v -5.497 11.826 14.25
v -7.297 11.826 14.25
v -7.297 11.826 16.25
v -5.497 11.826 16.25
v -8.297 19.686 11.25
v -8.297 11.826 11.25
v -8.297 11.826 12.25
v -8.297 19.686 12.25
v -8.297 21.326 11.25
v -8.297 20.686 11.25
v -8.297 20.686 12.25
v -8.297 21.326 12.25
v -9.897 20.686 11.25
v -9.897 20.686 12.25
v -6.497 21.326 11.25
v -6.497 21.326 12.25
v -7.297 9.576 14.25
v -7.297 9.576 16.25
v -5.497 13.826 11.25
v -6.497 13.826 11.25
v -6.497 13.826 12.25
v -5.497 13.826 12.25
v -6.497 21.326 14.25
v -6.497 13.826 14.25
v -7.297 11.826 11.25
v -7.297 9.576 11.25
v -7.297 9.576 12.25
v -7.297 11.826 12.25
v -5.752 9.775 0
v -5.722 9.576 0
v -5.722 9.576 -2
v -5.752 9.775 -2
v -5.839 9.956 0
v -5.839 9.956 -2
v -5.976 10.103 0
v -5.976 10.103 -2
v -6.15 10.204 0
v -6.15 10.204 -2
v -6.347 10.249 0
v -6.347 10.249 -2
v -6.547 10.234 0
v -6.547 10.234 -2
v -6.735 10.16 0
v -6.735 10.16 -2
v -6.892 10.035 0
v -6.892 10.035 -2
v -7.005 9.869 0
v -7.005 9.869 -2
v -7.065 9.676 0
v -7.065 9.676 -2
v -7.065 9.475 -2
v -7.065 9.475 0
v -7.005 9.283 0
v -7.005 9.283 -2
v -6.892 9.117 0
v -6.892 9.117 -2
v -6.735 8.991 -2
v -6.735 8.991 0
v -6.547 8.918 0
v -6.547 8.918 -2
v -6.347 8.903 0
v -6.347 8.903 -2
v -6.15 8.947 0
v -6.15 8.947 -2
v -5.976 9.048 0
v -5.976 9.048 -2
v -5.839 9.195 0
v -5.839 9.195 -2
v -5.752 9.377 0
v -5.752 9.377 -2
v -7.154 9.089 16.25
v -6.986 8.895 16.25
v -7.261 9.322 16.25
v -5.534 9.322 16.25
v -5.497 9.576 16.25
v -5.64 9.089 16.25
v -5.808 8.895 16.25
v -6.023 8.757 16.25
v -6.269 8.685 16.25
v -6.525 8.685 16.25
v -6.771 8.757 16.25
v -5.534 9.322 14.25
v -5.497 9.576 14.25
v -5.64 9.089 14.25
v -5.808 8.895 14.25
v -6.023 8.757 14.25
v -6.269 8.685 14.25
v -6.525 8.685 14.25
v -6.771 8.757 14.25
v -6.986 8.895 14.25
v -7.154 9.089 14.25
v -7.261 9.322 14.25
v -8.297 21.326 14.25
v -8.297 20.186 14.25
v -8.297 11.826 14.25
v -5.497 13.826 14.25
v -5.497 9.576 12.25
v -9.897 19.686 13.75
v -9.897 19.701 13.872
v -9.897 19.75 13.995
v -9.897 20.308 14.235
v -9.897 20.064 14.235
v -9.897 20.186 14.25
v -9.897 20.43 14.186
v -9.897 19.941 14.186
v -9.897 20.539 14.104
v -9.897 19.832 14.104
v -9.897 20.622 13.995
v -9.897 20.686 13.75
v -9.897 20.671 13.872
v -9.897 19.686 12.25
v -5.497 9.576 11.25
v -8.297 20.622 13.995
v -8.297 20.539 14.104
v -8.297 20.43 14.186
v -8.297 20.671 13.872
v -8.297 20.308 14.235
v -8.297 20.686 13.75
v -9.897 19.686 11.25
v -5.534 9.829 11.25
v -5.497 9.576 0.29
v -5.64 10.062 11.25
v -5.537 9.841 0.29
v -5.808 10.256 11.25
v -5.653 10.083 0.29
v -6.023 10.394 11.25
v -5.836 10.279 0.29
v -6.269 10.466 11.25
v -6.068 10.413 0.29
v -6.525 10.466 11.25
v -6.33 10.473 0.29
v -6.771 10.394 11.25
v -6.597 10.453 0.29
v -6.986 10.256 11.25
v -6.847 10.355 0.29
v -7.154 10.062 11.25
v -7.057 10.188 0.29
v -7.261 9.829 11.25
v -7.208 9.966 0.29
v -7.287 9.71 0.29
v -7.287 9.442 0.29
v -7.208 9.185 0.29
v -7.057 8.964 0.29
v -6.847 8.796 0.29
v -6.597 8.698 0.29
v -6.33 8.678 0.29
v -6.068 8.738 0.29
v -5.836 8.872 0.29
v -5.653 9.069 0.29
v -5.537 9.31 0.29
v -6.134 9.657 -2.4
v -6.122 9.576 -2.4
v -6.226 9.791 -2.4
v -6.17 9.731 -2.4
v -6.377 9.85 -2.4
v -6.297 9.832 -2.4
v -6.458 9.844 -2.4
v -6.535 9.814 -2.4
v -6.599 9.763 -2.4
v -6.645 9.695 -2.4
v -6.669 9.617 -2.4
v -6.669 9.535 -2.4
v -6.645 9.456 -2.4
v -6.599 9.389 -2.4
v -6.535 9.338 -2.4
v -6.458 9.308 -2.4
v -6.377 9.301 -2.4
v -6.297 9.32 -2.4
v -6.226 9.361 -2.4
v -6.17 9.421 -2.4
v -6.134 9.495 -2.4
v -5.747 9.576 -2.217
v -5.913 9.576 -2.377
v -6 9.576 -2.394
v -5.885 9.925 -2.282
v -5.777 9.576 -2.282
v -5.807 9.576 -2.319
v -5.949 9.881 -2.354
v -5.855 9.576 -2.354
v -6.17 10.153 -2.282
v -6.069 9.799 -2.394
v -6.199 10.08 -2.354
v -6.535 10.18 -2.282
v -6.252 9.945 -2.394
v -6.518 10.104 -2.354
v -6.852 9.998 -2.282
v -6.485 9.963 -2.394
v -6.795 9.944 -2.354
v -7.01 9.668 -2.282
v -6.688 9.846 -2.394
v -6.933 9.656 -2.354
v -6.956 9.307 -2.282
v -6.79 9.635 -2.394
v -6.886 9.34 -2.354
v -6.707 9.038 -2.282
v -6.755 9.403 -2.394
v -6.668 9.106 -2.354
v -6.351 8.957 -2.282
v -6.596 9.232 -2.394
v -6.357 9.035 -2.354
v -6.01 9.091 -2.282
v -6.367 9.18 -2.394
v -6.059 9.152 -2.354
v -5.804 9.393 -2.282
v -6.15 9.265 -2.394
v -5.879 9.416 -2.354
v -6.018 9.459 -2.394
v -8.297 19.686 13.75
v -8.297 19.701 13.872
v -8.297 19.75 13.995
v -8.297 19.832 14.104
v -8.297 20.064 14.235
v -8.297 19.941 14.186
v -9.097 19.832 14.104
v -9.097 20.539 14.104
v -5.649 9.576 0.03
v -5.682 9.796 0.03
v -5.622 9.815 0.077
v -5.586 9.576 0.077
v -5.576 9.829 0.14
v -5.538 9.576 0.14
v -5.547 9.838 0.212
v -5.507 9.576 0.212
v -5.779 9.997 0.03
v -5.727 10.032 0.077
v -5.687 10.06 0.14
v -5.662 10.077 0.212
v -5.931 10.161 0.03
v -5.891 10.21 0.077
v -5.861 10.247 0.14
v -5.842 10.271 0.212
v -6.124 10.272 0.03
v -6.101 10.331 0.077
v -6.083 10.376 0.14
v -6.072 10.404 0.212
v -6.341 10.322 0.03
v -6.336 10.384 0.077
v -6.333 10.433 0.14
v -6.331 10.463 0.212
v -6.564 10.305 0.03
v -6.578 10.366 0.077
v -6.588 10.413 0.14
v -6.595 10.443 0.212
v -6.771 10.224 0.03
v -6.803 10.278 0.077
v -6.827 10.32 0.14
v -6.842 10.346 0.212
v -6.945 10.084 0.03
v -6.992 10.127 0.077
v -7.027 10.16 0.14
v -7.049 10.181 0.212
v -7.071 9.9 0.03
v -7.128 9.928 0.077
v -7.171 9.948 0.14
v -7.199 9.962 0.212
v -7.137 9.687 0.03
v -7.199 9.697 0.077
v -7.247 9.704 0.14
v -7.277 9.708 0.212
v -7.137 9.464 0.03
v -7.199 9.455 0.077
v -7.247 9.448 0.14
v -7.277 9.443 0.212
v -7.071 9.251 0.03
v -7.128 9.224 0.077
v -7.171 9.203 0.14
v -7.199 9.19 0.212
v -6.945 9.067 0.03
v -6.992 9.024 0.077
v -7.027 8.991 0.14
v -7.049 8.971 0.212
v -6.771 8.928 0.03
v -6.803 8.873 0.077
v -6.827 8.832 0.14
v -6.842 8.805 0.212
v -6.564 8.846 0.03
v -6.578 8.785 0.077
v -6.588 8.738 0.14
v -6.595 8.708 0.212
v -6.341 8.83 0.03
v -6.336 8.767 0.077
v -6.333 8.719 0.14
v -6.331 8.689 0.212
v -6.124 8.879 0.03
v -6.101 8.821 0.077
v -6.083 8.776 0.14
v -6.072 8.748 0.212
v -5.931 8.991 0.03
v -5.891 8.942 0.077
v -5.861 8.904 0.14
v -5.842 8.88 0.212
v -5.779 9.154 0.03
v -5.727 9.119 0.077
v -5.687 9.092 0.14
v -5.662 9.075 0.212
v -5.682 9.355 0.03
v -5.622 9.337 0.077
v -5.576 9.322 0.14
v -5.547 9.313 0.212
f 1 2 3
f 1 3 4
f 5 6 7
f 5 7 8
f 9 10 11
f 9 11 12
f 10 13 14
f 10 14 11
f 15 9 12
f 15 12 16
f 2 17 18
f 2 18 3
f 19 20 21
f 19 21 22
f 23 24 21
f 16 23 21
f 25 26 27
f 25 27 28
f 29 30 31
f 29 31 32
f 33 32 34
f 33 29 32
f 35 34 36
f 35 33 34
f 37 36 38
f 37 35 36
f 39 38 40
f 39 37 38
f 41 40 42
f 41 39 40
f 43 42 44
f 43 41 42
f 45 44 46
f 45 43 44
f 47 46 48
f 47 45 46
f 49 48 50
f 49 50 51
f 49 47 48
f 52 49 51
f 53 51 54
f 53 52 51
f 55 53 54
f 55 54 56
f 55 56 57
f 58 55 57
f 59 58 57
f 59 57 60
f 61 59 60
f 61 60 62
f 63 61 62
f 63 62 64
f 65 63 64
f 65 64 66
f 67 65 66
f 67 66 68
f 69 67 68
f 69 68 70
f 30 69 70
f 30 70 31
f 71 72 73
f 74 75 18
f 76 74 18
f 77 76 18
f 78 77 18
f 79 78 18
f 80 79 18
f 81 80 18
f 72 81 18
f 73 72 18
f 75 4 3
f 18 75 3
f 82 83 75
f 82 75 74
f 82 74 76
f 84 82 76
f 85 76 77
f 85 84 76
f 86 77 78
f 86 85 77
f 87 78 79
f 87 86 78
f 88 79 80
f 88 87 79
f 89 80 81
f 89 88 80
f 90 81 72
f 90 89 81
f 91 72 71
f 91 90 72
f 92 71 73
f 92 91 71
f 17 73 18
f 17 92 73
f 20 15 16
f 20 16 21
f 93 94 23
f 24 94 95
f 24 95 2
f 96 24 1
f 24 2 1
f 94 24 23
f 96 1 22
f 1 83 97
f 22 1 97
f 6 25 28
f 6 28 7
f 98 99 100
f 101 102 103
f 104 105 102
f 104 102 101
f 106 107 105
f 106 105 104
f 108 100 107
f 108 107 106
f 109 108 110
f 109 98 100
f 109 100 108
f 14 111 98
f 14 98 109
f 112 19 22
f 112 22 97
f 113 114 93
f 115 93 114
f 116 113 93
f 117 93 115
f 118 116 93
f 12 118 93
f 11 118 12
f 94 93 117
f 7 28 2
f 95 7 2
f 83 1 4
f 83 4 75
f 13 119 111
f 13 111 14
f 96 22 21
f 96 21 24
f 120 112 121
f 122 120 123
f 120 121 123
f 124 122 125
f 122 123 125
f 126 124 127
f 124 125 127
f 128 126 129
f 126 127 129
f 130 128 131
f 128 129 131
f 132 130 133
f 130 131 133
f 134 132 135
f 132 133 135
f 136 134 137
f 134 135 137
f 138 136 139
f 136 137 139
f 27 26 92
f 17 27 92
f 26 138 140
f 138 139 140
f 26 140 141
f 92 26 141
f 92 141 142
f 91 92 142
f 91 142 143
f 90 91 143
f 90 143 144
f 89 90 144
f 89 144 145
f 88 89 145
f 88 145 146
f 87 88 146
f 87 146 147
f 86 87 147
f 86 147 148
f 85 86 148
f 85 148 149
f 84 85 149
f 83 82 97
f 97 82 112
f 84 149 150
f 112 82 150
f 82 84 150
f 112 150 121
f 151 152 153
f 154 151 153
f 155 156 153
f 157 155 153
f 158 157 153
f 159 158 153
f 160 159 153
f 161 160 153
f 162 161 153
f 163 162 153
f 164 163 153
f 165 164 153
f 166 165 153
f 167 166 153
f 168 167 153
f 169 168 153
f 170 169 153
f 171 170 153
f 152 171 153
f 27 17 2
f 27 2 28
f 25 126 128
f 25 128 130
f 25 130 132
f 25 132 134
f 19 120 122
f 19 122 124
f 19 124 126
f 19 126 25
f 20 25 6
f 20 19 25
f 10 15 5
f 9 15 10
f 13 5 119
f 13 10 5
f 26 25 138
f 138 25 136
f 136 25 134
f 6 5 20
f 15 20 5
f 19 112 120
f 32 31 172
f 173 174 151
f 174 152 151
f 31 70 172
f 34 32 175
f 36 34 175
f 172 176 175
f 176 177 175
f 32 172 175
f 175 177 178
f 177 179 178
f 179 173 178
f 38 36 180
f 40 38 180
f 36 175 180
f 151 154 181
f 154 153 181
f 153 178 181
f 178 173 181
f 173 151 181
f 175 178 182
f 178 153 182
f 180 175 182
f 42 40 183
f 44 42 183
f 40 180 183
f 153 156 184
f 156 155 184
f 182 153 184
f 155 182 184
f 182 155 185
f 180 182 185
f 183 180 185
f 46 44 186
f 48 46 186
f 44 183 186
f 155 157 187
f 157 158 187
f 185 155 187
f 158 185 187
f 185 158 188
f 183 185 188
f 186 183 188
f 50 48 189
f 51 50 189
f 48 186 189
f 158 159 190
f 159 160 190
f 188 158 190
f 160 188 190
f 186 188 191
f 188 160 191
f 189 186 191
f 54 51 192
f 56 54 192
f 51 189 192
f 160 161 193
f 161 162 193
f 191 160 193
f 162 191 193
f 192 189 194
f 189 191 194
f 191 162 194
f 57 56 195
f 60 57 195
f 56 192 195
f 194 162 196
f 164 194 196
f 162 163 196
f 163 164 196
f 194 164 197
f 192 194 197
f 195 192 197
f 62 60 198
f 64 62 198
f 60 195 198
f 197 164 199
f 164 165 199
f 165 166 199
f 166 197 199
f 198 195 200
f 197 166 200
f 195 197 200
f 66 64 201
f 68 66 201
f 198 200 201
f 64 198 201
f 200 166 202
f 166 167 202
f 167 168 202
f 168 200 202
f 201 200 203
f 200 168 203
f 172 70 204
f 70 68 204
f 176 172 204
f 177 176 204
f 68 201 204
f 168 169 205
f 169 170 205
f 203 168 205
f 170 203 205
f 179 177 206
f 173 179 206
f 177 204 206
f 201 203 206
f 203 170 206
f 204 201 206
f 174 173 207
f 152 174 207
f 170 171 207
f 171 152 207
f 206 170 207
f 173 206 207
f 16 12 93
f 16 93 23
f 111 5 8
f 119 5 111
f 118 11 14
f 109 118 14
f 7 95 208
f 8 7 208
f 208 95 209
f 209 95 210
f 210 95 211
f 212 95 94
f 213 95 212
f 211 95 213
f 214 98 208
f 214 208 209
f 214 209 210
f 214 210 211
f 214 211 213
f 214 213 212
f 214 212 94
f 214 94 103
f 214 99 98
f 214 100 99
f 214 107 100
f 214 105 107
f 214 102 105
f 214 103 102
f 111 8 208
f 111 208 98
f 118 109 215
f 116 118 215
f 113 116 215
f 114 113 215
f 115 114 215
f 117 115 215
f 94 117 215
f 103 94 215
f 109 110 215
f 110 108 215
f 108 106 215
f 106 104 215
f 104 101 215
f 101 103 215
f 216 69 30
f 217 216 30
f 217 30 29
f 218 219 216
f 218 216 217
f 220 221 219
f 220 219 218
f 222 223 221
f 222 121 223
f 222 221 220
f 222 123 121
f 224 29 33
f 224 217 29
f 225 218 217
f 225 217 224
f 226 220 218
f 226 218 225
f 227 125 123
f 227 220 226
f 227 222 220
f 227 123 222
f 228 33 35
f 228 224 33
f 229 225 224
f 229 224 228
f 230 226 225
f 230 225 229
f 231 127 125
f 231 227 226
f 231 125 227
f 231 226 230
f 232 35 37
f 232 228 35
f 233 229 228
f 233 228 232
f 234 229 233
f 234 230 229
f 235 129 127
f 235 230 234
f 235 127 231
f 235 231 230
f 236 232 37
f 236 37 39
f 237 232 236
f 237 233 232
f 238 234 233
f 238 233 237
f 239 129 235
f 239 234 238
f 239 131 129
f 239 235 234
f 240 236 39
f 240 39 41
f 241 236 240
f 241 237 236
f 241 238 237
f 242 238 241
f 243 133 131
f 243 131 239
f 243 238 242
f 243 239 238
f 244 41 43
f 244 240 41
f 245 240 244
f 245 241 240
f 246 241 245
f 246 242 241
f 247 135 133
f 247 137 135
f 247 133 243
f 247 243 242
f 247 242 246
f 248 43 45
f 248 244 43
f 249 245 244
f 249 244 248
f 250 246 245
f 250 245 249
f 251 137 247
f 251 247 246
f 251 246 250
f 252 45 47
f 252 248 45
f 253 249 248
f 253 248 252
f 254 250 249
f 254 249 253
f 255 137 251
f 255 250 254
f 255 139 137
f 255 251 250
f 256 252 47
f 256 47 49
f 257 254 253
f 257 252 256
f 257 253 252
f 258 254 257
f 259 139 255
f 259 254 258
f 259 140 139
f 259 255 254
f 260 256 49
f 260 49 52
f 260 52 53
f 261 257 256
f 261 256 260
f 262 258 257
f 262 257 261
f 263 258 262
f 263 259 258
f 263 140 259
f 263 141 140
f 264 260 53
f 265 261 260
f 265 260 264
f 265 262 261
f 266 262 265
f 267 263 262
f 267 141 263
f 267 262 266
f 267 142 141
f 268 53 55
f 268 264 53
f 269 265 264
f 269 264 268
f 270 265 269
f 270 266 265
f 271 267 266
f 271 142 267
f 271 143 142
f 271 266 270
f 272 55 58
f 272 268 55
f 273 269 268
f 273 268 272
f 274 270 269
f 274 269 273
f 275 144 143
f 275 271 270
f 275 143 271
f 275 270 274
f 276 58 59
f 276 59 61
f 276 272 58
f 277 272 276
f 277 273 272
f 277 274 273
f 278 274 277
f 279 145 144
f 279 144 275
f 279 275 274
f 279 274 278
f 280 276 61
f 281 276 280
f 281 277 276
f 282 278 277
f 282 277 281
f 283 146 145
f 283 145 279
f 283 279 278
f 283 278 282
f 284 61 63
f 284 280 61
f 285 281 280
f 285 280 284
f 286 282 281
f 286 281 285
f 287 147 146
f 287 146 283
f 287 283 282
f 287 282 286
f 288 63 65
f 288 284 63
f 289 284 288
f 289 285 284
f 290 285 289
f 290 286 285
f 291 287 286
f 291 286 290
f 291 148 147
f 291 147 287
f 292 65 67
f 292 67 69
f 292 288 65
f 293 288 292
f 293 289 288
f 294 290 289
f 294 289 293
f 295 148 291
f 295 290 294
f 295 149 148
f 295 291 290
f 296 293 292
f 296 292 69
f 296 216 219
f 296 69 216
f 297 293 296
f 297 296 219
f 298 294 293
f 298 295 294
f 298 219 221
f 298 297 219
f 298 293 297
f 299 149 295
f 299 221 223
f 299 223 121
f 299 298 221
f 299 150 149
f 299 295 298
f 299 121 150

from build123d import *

# Parameters (mm, degrees)
CROQUIS1_R              = 0.675
SALIENTE_EXTRUIR1_DEPTH = 2.4
REDONDEO1_SIZE          = 0.4
CROQUIS2_R              = 0.9
SALIENTE_EXTRUIR2_DEPTH = 12.25
SALIENTE_EXTRUIR3_DEPTH = 2
CROQUIS4_W              = 1.8
CROQUIS4_H              = 2
SALIENTE_EXTRUIR4_DEPTH = 4.25
CROQUIS6_W              = 2
CROQUIS6_H              = 2
SALIENTE_EXTRUIR5_DEPTH = 1
CROQUIS7_W              = 1.8
CROQUIS7_H              = 2
SALIENTE_EXTRUIR6_DEPTH = 7.5
CROQUIS9_W              = 1.6
CROQUIS9_H              = 1
SALIENTE_EXTRUIR7_DEPTH = 2
REDONDEO2_START         = -9.897058824
REDONDEO2_DEPTH         = 1.6
SALIENTE_EXTRUIR8_START = 1
SALIENTE_EXTRUIR8_DEPTH = 1
SALIENTE_EXTRUIR9_DEPTH = 2
REDONDEO3_R             = 0.3


with BuildPart() as part:
    # Croquis1 → Saliente-Extruir1 (new body)
    with BuildSketch(Plane.XY):
        with Locations((-6.397058824, 9.575658077)):
            Circle(CROQUIS1_R)
    extrude(amount=-SALIENTE_EXTRUIR1_DEPTH)

    # Redondeo1
    # a fillet whose section is not a circle: 0.4 mm, written as the material it takes off along each edge
    with BuildSketch(Plane(origin=(-6.397058824, 9.575658077, -2.4), x_dir=(1, 0, 0), z_dir=(0, -1, 0))) as redondeo1_piece_1:
        with BuildLine():
            Bezier((0.675, REDONDEO1_SIZE), (0.675, 0), (0.675 - REDONDEO1_SIZE, 0), weights=[1, 1.414213562, 1])
            Line((0.675 - REDONDEO1_SIZE, 0), (0.675, 0))
            Line((0.675, 0), (0.675, REDONDEO1_SIZE))
        make_face()
    revolve(axis=Axis((-6.397058824, 9.575658077, -2.4), (0, 0, 1)), mode=Mode.SUBTRACT)

    # Croquis2 → Saliente-Extruir2 (add)
    with BuildSketch(Plane.XY):
        with Locations((-6.397058824, 9.575658077)):
            Circle(CROQUIS2_R)
    extrude(amount=SALIENTE_EXTRUIR2_DEPTH)

    # Croquis3 → Saliente-Extruir3 (add)
    with BuildSketch(Plane.XY.offset(12.25)):
        with BuildLine():
            Line((-5.497058824, 9.575658077), (-7.297058824, 9.575658077))
            ThreePointArc((-7.297058824, 9.575658077), (-6.397058824, 8.675658077), (-5.497058824, 9.575658077))
        make_face()
    extrude(amount=SALIENTE_EXTRUIR3_DEPTH)

    # Croquis4 → Saliente-Extruir4 (add)
    with BuildSketch(Plane(origin=(0, 9.575658077, 0), x_dir=(1, 0, 0), z_dir=(0, 1, 0))):
        with Locations((-6.397058824, -13.25)):
            Rectangle(CROQUIS4_W, CROQUIS4_H)
    extrude(amount=SALIENTE_EXTRUIR4_DEPTH)

    # Croquis6 → Saliente-Extruir5 (add)
    with BuildSketch(Plane.ZY.offset(7.297058824)):
        with Locations((13.25, 12.825658077)):
            Rectangle(CROQUIS6_W, CROQUIS6_H)
    extrude(amount=SALIENTE_EXTRUIR5_DEPTH)

    # Croquis7 → Saliente-Extruir6 (add)
    with BuildSketch(Plane(origin=(0, 13.825658077, 0), x_dir=(1, 0, 0), z_dir=(0, 1, 0))):
        with Locations((-7.397058824, -13.25)):
            Rectangle(CROQUIS7_W, CROQUIS7_H)
    extrude(amount=SALIENTE_EXTRUIR6_DEPTH)

    # Croquis9 → Saliente-Extruir7 (add)
    with BuildSketch(Plane(origin=(0, 0, 12.25), x_dir=(-1, 0, 0), z_dir=(0, 0, -1))):
        with Locations((9.097058824, 20.185658077)):
            Rectangle(CROQUIS9_W, CROQUIS9_H)
    extrude(amount=-SALIENTE_EXTRUIR7_DEPTH)

    # Redondeo2: read off the stored shape, not the designer's step
    # Redondeo2 outline → Redondeo2 (cut)
    with BuildSketch(Plane.YZ.offset(REDONDEO2_START)):
        with BuildLine():
            Line((19.685658077, 14.25), (19.685658077, 13.75))
            add(Edge.make_bspline(
                [(19.685658077, 13.75), (19.685658077, 14.25), (20.185658077, 14.25)],
                knots=[0, 0, 0, 1, 1, 1], degree=2, weights=[1, 0.707106781, 1]))
            Line((20.185658077, 14.25), (19.685658077, 14.25))
        make_face()
        with BuildLine():
            Line((20.685658077, 14.25), (20.185658077, 14.25))
            add(Edge.make_bspline(
                [(20.685658077, 13.75), (20.685658077, 14.25), (20.185658077, 14.25)],
                knots=[0, 0, 0, 1, 1, 1], degree=2, weights=[1, 0.707106781, 1]))
            Line((20.685658077, 13.75), (20.685658077, 14.25))
        make_face()
    extrude(amount=REDONDEO2_DEPTH, mode=Mode.SUBTRACT)

    # Croquis10 → Saliente-Extruir8 (add)
    with BuildSketch(Plane(origin=(0, 0, 12.25), x_dir=(-1, 0, 0), z_dir=(0, 0, -1)).offset(SALIENTE_EXTRUIR8_START)):
        with BuildLine():
            Line((7.297058824, 9.575658077), (7.297058824, 11.825658077))
            Line((7.297058824, 11.825658077), (8.297058824, 11.825658077))
            Line((8.297058824, 11.825658077), (8.297058824, 19.685658077))
            Line((8.297058824, 19.685658077), (9.897058824, 19.685658077))
            Line((9.897058824, 19.685658077), (9.897058824, 20.685658077))
            Line((9.897058824, 20.685658077), (8.297058824, 20.685658077))
            Line((8.297058824, 20.685658077), (8.297058824, 21.325658077))
            Line((8.297058824, 21.325658077), (6.497058824, 21.325658077))
            Line((6.497058824, 21.325658077), (6.497058824, 13.825658077))
            Line((6.497058824, 13.825658077), (5.497058824, 13.825658077))
            Line((5.497058824, 13.825658077), (5.497058824, 9.575658077))
            ThreePointArc((5.497058824, 9.575658077), (6.397058824, 10.475658077), (7.297058824, 9.575658077))
        make_face()
    extrude(amount=-SALIENTE_EXTRUIR8_DEPTH)

    # Croquis11 → Saliente-Extruir9 (add)
    with BuildSketch(Plane.XY.offset(14.25)):
        with BuildLine():
            Line((-7.297058824, 11.825658077), (-5.497058824, 11.825658077))
            Line((-5.497058824, 11.825658077), (-5.497058824, 9.575658077))
            ThreePointArc((-5.497058824, 9.575658077), (-6.397058824, 8.675658077), (-7.297058824, 9.575658077))
            Line((-7.297058824, 9.575658077), (-7.297058824, 11.825658077))
        make_face()
    extrude(amount=SALIENTE_EXTRUIR9_DEPTH)

    # Redondeo3
    # the kernel refuses this fillet: 0.3 mm, written as the material it takes off along each edge
    with BuildSketch(Plane(origin=(-6.397058824, 9.575658077, 0), x_dir=(1, 0, 0), z_dir=(0, -1, 0))) as redondeo3_piece_1:
        with BuildLine():
            CenterArc((0.6, 0.290473751), REDONDEO3_R, 284.477512185, 75.522487815)
            Line((0.675, 0), (0.6765, -0.005809475))
            ThreePointArc((0.6765, -0.005809475), (0.7875, -0.006), (0.9, -0.006))
            Line((0.9, -0.006), (0.906, 0))
            Line((0.906, 0), (0.906, 0.290473751))
            Line((0.906, 0.290473751), (0.9, 0.290473751))
        make_face()
    revolve(axis=Axis((-6.397058824, 9.575658077, 0), (0, 0, 1)), mode=Mode.SUBTRACT)


solid = part.part
